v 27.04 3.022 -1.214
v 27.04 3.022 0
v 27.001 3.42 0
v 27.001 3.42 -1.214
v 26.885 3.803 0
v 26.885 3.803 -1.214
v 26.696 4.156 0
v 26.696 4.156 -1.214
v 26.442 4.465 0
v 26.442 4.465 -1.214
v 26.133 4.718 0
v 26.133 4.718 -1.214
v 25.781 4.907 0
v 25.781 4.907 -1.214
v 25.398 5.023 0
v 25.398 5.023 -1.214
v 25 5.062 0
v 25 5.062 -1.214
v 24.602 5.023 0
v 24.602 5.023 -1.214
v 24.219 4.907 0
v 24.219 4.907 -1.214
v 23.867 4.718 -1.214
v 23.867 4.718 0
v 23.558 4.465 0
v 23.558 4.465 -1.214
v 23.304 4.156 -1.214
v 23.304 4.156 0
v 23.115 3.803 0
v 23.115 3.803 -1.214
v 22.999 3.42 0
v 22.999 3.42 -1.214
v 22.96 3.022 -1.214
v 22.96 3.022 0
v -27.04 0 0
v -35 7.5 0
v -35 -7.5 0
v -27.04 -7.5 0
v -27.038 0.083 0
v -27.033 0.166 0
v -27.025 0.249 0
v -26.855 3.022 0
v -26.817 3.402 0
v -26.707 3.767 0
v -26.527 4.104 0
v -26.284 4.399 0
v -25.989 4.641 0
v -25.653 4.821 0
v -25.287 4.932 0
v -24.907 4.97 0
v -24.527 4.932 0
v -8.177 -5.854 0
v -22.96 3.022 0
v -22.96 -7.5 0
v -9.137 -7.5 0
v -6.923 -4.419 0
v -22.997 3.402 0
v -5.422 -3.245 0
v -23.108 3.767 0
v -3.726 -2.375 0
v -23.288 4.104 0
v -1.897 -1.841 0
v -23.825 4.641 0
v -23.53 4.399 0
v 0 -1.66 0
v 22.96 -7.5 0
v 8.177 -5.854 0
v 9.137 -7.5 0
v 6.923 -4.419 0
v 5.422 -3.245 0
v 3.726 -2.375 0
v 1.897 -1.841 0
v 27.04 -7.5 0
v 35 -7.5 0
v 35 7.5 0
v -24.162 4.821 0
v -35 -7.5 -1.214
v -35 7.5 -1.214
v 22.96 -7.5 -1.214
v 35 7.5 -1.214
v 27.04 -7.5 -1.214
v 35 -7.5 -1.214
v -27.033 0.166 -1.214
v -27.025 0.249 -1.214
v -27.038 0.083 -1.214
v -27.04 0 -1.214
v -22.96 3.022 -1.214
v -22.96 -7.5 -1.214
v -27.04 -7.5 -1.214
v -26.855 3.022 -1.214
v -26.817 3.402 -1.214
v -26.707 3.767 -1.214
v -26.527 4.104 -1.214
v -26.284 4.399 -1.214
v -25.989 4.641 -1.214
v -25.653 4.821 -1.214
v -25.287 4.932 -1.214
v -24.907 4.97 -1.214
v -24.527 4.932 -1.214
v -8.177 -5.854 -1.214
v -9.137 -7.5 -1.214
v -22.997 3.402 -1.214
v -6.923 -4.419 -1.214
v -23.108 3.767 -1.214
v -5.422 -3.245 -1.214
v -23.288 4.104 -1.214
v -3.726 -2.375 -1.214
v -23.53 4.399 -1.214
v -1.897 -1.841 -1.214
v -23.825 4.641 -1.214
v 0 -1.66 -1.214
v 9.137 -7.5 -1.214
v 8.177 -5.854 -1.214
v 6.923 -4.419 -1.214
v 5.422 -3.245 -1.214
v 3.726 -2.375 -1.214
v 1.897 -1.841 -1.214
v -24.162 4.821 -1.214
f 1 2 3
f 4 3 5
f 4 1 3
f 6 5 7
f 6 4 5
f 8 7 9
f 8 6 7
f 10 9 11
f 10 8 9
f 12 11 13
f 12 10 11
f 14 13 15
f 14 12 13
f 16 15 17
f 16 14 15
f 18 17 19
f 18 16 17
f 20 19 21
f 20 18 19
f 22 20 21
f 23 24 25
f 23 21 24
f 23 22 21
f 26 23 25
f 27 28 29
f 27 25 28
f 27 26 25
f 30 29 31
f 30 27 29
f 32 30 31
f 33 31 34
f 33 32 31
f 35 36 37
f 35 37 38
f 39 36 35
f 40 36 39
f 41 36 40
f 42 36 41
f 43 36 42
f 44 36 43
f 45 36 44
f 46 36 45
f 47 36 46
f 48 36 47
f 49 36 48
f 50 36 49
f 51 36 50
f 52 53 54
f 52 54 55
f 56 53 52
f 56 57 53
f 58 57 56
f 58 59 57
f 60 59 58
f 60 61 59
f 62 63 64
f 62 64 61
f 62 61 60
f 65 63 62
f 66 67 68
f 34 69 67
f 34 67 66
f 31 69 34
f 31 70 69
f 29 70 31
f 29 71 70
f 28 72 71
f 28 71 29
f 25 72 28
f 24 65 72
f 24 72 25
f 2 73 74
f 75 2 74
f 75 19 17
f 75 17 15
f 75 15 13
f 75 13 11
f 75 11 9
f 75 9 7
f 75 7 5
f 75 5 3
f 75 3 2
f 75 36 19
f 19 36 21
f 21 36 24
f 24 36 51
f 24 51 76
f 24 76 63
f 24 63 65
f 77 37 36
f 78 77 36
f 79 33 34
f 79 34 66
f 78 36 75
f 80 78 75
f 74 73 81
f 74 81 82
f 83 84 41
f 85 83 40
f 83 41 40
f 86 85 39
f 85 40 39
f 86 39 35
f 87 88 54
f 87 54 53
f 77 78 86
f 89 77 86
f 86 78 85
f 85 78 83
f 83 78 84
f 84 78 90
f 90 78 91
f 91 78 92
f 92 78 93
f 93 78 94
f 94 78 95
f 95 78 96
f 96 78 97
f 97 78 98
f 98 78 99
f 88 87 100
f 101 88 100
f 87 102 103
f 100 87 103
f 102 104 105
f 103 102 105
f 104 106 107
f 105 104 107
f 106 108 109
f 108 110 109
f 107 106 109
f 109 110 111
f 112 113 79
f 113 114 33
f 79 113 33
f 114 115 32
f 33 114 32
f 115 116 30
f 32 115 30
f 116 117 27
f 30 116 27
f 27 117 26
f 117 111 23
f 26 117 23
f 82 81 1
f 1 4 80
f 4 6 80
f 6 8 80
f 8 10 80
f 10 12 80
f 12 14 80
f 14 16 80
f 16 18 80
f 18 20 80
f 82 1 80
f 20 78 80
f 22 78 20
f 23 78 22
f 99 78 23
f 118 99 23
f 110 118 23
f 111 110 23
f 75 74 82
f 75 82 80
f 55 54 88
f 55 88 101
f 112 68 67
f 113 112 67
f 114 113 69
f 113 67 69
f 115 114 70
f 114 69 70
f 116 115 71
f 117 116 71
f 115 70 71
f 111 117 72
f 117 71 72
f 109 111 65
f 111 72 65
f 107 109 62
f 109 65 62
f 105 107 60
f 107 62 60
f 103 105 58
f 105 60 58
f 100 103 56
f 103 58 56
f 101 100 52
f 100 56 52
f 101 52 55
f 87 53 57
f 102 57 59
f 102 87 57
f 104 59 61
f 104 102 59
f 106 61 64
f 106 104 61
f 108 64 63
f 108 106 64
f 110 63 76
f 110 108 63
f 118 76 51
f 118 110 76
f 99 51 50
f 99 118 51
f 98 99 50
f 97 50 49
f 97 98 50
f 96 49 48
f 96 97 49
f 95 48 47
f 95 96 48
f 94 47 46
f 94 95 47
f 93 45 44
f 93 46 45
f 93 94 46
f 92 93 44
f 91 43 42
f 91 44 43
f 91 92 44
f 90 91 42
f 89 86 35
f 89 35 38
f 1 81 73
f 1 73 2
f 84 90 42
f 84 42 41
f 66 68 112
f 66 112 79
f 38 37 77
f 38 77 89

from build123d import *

# Parameters (mm, degrees)
SKETCH1_W          = 70
SKETCH1_H          = 15
SKETCH1_R          = 2.04
BASE_FLANGE1_DEPTH = 1.21412
SKETCH3_R          = 10.067909511
CUT_EXTRUDE1_DEPTH = 10
CUT_EXTRUDE2_DEPTH = 10


# Sheet-metal steps are written as plain solids
with BuildPart() as part:
    # Sketch1 → Base-Flange1 (new body)
    with BuildSketch(Plane.XY):
        Rectangle(SKETCH1_W, SKETCH1_H)
        with Locations((-25, 0)):
            Circle(SKETCH1_R, mode=Mode.SUBTRACT)
        with Locations((25, 0)):
            Circle(SKETCH1_R, mode=Mode.SUBTRACT)
    extrude(amount=-BASE_FLANGE1_DEPTH)

    # Sketch3 → Cut-Extrude1 (cut)
    with BuildSketch(Plane.XY):
        with Locations((0, -11.728394917)):
            Circle(SKETCH3_R)
    extrude(amount=-CUT_EXTRUDE1_DEPTH, mode=Mode.SUBTRACT)

    # Sketch4 → Cut-Extrude2 (cut)
    with BuildSketch(Plane(origin=(0, 0, -1.21412), x_dir=(-1, 0, 0), z_dir=(0, 0, -1))):
        with BuildLine():
            Line((27.04, 0), (27.04, -7.5))
            Line((27.04, -7.5), (22.96, -7.5))
            Line((22.96, -7.5), (22.96, 0))
            Line((22.96, 0), (22.96, 3.022234101))
            ThreePointArc((22.96, 3.022234101), (24.907398497, 4.969632598), (26.854796994, 3.022234101))
            Line((26.854796994, 3.022234101), (27.04, 0))
        make_face()
        with BuildLine():
            Line((-22.96, 0), (-22.96, -7.5))
            Line((-22.96, -7.5), (-27.04, -7.5))
            Line((-27.04, -7.5), (-27.04, 0))
            Line((-27.04, 0), (-27.04, 3.022234101))
            ThreePointArc((-27.04, 3.022234101), (-25, 5.062234101), (-22.96, 3.022234101))
            Line((-22.96, 3.022234101), (-22.96, 0))
        make_face()
    extrude(amount=-CUT_EXTRUDE2_DEPTH, mode=Mode.SUBTRACT)


solid = part.part
